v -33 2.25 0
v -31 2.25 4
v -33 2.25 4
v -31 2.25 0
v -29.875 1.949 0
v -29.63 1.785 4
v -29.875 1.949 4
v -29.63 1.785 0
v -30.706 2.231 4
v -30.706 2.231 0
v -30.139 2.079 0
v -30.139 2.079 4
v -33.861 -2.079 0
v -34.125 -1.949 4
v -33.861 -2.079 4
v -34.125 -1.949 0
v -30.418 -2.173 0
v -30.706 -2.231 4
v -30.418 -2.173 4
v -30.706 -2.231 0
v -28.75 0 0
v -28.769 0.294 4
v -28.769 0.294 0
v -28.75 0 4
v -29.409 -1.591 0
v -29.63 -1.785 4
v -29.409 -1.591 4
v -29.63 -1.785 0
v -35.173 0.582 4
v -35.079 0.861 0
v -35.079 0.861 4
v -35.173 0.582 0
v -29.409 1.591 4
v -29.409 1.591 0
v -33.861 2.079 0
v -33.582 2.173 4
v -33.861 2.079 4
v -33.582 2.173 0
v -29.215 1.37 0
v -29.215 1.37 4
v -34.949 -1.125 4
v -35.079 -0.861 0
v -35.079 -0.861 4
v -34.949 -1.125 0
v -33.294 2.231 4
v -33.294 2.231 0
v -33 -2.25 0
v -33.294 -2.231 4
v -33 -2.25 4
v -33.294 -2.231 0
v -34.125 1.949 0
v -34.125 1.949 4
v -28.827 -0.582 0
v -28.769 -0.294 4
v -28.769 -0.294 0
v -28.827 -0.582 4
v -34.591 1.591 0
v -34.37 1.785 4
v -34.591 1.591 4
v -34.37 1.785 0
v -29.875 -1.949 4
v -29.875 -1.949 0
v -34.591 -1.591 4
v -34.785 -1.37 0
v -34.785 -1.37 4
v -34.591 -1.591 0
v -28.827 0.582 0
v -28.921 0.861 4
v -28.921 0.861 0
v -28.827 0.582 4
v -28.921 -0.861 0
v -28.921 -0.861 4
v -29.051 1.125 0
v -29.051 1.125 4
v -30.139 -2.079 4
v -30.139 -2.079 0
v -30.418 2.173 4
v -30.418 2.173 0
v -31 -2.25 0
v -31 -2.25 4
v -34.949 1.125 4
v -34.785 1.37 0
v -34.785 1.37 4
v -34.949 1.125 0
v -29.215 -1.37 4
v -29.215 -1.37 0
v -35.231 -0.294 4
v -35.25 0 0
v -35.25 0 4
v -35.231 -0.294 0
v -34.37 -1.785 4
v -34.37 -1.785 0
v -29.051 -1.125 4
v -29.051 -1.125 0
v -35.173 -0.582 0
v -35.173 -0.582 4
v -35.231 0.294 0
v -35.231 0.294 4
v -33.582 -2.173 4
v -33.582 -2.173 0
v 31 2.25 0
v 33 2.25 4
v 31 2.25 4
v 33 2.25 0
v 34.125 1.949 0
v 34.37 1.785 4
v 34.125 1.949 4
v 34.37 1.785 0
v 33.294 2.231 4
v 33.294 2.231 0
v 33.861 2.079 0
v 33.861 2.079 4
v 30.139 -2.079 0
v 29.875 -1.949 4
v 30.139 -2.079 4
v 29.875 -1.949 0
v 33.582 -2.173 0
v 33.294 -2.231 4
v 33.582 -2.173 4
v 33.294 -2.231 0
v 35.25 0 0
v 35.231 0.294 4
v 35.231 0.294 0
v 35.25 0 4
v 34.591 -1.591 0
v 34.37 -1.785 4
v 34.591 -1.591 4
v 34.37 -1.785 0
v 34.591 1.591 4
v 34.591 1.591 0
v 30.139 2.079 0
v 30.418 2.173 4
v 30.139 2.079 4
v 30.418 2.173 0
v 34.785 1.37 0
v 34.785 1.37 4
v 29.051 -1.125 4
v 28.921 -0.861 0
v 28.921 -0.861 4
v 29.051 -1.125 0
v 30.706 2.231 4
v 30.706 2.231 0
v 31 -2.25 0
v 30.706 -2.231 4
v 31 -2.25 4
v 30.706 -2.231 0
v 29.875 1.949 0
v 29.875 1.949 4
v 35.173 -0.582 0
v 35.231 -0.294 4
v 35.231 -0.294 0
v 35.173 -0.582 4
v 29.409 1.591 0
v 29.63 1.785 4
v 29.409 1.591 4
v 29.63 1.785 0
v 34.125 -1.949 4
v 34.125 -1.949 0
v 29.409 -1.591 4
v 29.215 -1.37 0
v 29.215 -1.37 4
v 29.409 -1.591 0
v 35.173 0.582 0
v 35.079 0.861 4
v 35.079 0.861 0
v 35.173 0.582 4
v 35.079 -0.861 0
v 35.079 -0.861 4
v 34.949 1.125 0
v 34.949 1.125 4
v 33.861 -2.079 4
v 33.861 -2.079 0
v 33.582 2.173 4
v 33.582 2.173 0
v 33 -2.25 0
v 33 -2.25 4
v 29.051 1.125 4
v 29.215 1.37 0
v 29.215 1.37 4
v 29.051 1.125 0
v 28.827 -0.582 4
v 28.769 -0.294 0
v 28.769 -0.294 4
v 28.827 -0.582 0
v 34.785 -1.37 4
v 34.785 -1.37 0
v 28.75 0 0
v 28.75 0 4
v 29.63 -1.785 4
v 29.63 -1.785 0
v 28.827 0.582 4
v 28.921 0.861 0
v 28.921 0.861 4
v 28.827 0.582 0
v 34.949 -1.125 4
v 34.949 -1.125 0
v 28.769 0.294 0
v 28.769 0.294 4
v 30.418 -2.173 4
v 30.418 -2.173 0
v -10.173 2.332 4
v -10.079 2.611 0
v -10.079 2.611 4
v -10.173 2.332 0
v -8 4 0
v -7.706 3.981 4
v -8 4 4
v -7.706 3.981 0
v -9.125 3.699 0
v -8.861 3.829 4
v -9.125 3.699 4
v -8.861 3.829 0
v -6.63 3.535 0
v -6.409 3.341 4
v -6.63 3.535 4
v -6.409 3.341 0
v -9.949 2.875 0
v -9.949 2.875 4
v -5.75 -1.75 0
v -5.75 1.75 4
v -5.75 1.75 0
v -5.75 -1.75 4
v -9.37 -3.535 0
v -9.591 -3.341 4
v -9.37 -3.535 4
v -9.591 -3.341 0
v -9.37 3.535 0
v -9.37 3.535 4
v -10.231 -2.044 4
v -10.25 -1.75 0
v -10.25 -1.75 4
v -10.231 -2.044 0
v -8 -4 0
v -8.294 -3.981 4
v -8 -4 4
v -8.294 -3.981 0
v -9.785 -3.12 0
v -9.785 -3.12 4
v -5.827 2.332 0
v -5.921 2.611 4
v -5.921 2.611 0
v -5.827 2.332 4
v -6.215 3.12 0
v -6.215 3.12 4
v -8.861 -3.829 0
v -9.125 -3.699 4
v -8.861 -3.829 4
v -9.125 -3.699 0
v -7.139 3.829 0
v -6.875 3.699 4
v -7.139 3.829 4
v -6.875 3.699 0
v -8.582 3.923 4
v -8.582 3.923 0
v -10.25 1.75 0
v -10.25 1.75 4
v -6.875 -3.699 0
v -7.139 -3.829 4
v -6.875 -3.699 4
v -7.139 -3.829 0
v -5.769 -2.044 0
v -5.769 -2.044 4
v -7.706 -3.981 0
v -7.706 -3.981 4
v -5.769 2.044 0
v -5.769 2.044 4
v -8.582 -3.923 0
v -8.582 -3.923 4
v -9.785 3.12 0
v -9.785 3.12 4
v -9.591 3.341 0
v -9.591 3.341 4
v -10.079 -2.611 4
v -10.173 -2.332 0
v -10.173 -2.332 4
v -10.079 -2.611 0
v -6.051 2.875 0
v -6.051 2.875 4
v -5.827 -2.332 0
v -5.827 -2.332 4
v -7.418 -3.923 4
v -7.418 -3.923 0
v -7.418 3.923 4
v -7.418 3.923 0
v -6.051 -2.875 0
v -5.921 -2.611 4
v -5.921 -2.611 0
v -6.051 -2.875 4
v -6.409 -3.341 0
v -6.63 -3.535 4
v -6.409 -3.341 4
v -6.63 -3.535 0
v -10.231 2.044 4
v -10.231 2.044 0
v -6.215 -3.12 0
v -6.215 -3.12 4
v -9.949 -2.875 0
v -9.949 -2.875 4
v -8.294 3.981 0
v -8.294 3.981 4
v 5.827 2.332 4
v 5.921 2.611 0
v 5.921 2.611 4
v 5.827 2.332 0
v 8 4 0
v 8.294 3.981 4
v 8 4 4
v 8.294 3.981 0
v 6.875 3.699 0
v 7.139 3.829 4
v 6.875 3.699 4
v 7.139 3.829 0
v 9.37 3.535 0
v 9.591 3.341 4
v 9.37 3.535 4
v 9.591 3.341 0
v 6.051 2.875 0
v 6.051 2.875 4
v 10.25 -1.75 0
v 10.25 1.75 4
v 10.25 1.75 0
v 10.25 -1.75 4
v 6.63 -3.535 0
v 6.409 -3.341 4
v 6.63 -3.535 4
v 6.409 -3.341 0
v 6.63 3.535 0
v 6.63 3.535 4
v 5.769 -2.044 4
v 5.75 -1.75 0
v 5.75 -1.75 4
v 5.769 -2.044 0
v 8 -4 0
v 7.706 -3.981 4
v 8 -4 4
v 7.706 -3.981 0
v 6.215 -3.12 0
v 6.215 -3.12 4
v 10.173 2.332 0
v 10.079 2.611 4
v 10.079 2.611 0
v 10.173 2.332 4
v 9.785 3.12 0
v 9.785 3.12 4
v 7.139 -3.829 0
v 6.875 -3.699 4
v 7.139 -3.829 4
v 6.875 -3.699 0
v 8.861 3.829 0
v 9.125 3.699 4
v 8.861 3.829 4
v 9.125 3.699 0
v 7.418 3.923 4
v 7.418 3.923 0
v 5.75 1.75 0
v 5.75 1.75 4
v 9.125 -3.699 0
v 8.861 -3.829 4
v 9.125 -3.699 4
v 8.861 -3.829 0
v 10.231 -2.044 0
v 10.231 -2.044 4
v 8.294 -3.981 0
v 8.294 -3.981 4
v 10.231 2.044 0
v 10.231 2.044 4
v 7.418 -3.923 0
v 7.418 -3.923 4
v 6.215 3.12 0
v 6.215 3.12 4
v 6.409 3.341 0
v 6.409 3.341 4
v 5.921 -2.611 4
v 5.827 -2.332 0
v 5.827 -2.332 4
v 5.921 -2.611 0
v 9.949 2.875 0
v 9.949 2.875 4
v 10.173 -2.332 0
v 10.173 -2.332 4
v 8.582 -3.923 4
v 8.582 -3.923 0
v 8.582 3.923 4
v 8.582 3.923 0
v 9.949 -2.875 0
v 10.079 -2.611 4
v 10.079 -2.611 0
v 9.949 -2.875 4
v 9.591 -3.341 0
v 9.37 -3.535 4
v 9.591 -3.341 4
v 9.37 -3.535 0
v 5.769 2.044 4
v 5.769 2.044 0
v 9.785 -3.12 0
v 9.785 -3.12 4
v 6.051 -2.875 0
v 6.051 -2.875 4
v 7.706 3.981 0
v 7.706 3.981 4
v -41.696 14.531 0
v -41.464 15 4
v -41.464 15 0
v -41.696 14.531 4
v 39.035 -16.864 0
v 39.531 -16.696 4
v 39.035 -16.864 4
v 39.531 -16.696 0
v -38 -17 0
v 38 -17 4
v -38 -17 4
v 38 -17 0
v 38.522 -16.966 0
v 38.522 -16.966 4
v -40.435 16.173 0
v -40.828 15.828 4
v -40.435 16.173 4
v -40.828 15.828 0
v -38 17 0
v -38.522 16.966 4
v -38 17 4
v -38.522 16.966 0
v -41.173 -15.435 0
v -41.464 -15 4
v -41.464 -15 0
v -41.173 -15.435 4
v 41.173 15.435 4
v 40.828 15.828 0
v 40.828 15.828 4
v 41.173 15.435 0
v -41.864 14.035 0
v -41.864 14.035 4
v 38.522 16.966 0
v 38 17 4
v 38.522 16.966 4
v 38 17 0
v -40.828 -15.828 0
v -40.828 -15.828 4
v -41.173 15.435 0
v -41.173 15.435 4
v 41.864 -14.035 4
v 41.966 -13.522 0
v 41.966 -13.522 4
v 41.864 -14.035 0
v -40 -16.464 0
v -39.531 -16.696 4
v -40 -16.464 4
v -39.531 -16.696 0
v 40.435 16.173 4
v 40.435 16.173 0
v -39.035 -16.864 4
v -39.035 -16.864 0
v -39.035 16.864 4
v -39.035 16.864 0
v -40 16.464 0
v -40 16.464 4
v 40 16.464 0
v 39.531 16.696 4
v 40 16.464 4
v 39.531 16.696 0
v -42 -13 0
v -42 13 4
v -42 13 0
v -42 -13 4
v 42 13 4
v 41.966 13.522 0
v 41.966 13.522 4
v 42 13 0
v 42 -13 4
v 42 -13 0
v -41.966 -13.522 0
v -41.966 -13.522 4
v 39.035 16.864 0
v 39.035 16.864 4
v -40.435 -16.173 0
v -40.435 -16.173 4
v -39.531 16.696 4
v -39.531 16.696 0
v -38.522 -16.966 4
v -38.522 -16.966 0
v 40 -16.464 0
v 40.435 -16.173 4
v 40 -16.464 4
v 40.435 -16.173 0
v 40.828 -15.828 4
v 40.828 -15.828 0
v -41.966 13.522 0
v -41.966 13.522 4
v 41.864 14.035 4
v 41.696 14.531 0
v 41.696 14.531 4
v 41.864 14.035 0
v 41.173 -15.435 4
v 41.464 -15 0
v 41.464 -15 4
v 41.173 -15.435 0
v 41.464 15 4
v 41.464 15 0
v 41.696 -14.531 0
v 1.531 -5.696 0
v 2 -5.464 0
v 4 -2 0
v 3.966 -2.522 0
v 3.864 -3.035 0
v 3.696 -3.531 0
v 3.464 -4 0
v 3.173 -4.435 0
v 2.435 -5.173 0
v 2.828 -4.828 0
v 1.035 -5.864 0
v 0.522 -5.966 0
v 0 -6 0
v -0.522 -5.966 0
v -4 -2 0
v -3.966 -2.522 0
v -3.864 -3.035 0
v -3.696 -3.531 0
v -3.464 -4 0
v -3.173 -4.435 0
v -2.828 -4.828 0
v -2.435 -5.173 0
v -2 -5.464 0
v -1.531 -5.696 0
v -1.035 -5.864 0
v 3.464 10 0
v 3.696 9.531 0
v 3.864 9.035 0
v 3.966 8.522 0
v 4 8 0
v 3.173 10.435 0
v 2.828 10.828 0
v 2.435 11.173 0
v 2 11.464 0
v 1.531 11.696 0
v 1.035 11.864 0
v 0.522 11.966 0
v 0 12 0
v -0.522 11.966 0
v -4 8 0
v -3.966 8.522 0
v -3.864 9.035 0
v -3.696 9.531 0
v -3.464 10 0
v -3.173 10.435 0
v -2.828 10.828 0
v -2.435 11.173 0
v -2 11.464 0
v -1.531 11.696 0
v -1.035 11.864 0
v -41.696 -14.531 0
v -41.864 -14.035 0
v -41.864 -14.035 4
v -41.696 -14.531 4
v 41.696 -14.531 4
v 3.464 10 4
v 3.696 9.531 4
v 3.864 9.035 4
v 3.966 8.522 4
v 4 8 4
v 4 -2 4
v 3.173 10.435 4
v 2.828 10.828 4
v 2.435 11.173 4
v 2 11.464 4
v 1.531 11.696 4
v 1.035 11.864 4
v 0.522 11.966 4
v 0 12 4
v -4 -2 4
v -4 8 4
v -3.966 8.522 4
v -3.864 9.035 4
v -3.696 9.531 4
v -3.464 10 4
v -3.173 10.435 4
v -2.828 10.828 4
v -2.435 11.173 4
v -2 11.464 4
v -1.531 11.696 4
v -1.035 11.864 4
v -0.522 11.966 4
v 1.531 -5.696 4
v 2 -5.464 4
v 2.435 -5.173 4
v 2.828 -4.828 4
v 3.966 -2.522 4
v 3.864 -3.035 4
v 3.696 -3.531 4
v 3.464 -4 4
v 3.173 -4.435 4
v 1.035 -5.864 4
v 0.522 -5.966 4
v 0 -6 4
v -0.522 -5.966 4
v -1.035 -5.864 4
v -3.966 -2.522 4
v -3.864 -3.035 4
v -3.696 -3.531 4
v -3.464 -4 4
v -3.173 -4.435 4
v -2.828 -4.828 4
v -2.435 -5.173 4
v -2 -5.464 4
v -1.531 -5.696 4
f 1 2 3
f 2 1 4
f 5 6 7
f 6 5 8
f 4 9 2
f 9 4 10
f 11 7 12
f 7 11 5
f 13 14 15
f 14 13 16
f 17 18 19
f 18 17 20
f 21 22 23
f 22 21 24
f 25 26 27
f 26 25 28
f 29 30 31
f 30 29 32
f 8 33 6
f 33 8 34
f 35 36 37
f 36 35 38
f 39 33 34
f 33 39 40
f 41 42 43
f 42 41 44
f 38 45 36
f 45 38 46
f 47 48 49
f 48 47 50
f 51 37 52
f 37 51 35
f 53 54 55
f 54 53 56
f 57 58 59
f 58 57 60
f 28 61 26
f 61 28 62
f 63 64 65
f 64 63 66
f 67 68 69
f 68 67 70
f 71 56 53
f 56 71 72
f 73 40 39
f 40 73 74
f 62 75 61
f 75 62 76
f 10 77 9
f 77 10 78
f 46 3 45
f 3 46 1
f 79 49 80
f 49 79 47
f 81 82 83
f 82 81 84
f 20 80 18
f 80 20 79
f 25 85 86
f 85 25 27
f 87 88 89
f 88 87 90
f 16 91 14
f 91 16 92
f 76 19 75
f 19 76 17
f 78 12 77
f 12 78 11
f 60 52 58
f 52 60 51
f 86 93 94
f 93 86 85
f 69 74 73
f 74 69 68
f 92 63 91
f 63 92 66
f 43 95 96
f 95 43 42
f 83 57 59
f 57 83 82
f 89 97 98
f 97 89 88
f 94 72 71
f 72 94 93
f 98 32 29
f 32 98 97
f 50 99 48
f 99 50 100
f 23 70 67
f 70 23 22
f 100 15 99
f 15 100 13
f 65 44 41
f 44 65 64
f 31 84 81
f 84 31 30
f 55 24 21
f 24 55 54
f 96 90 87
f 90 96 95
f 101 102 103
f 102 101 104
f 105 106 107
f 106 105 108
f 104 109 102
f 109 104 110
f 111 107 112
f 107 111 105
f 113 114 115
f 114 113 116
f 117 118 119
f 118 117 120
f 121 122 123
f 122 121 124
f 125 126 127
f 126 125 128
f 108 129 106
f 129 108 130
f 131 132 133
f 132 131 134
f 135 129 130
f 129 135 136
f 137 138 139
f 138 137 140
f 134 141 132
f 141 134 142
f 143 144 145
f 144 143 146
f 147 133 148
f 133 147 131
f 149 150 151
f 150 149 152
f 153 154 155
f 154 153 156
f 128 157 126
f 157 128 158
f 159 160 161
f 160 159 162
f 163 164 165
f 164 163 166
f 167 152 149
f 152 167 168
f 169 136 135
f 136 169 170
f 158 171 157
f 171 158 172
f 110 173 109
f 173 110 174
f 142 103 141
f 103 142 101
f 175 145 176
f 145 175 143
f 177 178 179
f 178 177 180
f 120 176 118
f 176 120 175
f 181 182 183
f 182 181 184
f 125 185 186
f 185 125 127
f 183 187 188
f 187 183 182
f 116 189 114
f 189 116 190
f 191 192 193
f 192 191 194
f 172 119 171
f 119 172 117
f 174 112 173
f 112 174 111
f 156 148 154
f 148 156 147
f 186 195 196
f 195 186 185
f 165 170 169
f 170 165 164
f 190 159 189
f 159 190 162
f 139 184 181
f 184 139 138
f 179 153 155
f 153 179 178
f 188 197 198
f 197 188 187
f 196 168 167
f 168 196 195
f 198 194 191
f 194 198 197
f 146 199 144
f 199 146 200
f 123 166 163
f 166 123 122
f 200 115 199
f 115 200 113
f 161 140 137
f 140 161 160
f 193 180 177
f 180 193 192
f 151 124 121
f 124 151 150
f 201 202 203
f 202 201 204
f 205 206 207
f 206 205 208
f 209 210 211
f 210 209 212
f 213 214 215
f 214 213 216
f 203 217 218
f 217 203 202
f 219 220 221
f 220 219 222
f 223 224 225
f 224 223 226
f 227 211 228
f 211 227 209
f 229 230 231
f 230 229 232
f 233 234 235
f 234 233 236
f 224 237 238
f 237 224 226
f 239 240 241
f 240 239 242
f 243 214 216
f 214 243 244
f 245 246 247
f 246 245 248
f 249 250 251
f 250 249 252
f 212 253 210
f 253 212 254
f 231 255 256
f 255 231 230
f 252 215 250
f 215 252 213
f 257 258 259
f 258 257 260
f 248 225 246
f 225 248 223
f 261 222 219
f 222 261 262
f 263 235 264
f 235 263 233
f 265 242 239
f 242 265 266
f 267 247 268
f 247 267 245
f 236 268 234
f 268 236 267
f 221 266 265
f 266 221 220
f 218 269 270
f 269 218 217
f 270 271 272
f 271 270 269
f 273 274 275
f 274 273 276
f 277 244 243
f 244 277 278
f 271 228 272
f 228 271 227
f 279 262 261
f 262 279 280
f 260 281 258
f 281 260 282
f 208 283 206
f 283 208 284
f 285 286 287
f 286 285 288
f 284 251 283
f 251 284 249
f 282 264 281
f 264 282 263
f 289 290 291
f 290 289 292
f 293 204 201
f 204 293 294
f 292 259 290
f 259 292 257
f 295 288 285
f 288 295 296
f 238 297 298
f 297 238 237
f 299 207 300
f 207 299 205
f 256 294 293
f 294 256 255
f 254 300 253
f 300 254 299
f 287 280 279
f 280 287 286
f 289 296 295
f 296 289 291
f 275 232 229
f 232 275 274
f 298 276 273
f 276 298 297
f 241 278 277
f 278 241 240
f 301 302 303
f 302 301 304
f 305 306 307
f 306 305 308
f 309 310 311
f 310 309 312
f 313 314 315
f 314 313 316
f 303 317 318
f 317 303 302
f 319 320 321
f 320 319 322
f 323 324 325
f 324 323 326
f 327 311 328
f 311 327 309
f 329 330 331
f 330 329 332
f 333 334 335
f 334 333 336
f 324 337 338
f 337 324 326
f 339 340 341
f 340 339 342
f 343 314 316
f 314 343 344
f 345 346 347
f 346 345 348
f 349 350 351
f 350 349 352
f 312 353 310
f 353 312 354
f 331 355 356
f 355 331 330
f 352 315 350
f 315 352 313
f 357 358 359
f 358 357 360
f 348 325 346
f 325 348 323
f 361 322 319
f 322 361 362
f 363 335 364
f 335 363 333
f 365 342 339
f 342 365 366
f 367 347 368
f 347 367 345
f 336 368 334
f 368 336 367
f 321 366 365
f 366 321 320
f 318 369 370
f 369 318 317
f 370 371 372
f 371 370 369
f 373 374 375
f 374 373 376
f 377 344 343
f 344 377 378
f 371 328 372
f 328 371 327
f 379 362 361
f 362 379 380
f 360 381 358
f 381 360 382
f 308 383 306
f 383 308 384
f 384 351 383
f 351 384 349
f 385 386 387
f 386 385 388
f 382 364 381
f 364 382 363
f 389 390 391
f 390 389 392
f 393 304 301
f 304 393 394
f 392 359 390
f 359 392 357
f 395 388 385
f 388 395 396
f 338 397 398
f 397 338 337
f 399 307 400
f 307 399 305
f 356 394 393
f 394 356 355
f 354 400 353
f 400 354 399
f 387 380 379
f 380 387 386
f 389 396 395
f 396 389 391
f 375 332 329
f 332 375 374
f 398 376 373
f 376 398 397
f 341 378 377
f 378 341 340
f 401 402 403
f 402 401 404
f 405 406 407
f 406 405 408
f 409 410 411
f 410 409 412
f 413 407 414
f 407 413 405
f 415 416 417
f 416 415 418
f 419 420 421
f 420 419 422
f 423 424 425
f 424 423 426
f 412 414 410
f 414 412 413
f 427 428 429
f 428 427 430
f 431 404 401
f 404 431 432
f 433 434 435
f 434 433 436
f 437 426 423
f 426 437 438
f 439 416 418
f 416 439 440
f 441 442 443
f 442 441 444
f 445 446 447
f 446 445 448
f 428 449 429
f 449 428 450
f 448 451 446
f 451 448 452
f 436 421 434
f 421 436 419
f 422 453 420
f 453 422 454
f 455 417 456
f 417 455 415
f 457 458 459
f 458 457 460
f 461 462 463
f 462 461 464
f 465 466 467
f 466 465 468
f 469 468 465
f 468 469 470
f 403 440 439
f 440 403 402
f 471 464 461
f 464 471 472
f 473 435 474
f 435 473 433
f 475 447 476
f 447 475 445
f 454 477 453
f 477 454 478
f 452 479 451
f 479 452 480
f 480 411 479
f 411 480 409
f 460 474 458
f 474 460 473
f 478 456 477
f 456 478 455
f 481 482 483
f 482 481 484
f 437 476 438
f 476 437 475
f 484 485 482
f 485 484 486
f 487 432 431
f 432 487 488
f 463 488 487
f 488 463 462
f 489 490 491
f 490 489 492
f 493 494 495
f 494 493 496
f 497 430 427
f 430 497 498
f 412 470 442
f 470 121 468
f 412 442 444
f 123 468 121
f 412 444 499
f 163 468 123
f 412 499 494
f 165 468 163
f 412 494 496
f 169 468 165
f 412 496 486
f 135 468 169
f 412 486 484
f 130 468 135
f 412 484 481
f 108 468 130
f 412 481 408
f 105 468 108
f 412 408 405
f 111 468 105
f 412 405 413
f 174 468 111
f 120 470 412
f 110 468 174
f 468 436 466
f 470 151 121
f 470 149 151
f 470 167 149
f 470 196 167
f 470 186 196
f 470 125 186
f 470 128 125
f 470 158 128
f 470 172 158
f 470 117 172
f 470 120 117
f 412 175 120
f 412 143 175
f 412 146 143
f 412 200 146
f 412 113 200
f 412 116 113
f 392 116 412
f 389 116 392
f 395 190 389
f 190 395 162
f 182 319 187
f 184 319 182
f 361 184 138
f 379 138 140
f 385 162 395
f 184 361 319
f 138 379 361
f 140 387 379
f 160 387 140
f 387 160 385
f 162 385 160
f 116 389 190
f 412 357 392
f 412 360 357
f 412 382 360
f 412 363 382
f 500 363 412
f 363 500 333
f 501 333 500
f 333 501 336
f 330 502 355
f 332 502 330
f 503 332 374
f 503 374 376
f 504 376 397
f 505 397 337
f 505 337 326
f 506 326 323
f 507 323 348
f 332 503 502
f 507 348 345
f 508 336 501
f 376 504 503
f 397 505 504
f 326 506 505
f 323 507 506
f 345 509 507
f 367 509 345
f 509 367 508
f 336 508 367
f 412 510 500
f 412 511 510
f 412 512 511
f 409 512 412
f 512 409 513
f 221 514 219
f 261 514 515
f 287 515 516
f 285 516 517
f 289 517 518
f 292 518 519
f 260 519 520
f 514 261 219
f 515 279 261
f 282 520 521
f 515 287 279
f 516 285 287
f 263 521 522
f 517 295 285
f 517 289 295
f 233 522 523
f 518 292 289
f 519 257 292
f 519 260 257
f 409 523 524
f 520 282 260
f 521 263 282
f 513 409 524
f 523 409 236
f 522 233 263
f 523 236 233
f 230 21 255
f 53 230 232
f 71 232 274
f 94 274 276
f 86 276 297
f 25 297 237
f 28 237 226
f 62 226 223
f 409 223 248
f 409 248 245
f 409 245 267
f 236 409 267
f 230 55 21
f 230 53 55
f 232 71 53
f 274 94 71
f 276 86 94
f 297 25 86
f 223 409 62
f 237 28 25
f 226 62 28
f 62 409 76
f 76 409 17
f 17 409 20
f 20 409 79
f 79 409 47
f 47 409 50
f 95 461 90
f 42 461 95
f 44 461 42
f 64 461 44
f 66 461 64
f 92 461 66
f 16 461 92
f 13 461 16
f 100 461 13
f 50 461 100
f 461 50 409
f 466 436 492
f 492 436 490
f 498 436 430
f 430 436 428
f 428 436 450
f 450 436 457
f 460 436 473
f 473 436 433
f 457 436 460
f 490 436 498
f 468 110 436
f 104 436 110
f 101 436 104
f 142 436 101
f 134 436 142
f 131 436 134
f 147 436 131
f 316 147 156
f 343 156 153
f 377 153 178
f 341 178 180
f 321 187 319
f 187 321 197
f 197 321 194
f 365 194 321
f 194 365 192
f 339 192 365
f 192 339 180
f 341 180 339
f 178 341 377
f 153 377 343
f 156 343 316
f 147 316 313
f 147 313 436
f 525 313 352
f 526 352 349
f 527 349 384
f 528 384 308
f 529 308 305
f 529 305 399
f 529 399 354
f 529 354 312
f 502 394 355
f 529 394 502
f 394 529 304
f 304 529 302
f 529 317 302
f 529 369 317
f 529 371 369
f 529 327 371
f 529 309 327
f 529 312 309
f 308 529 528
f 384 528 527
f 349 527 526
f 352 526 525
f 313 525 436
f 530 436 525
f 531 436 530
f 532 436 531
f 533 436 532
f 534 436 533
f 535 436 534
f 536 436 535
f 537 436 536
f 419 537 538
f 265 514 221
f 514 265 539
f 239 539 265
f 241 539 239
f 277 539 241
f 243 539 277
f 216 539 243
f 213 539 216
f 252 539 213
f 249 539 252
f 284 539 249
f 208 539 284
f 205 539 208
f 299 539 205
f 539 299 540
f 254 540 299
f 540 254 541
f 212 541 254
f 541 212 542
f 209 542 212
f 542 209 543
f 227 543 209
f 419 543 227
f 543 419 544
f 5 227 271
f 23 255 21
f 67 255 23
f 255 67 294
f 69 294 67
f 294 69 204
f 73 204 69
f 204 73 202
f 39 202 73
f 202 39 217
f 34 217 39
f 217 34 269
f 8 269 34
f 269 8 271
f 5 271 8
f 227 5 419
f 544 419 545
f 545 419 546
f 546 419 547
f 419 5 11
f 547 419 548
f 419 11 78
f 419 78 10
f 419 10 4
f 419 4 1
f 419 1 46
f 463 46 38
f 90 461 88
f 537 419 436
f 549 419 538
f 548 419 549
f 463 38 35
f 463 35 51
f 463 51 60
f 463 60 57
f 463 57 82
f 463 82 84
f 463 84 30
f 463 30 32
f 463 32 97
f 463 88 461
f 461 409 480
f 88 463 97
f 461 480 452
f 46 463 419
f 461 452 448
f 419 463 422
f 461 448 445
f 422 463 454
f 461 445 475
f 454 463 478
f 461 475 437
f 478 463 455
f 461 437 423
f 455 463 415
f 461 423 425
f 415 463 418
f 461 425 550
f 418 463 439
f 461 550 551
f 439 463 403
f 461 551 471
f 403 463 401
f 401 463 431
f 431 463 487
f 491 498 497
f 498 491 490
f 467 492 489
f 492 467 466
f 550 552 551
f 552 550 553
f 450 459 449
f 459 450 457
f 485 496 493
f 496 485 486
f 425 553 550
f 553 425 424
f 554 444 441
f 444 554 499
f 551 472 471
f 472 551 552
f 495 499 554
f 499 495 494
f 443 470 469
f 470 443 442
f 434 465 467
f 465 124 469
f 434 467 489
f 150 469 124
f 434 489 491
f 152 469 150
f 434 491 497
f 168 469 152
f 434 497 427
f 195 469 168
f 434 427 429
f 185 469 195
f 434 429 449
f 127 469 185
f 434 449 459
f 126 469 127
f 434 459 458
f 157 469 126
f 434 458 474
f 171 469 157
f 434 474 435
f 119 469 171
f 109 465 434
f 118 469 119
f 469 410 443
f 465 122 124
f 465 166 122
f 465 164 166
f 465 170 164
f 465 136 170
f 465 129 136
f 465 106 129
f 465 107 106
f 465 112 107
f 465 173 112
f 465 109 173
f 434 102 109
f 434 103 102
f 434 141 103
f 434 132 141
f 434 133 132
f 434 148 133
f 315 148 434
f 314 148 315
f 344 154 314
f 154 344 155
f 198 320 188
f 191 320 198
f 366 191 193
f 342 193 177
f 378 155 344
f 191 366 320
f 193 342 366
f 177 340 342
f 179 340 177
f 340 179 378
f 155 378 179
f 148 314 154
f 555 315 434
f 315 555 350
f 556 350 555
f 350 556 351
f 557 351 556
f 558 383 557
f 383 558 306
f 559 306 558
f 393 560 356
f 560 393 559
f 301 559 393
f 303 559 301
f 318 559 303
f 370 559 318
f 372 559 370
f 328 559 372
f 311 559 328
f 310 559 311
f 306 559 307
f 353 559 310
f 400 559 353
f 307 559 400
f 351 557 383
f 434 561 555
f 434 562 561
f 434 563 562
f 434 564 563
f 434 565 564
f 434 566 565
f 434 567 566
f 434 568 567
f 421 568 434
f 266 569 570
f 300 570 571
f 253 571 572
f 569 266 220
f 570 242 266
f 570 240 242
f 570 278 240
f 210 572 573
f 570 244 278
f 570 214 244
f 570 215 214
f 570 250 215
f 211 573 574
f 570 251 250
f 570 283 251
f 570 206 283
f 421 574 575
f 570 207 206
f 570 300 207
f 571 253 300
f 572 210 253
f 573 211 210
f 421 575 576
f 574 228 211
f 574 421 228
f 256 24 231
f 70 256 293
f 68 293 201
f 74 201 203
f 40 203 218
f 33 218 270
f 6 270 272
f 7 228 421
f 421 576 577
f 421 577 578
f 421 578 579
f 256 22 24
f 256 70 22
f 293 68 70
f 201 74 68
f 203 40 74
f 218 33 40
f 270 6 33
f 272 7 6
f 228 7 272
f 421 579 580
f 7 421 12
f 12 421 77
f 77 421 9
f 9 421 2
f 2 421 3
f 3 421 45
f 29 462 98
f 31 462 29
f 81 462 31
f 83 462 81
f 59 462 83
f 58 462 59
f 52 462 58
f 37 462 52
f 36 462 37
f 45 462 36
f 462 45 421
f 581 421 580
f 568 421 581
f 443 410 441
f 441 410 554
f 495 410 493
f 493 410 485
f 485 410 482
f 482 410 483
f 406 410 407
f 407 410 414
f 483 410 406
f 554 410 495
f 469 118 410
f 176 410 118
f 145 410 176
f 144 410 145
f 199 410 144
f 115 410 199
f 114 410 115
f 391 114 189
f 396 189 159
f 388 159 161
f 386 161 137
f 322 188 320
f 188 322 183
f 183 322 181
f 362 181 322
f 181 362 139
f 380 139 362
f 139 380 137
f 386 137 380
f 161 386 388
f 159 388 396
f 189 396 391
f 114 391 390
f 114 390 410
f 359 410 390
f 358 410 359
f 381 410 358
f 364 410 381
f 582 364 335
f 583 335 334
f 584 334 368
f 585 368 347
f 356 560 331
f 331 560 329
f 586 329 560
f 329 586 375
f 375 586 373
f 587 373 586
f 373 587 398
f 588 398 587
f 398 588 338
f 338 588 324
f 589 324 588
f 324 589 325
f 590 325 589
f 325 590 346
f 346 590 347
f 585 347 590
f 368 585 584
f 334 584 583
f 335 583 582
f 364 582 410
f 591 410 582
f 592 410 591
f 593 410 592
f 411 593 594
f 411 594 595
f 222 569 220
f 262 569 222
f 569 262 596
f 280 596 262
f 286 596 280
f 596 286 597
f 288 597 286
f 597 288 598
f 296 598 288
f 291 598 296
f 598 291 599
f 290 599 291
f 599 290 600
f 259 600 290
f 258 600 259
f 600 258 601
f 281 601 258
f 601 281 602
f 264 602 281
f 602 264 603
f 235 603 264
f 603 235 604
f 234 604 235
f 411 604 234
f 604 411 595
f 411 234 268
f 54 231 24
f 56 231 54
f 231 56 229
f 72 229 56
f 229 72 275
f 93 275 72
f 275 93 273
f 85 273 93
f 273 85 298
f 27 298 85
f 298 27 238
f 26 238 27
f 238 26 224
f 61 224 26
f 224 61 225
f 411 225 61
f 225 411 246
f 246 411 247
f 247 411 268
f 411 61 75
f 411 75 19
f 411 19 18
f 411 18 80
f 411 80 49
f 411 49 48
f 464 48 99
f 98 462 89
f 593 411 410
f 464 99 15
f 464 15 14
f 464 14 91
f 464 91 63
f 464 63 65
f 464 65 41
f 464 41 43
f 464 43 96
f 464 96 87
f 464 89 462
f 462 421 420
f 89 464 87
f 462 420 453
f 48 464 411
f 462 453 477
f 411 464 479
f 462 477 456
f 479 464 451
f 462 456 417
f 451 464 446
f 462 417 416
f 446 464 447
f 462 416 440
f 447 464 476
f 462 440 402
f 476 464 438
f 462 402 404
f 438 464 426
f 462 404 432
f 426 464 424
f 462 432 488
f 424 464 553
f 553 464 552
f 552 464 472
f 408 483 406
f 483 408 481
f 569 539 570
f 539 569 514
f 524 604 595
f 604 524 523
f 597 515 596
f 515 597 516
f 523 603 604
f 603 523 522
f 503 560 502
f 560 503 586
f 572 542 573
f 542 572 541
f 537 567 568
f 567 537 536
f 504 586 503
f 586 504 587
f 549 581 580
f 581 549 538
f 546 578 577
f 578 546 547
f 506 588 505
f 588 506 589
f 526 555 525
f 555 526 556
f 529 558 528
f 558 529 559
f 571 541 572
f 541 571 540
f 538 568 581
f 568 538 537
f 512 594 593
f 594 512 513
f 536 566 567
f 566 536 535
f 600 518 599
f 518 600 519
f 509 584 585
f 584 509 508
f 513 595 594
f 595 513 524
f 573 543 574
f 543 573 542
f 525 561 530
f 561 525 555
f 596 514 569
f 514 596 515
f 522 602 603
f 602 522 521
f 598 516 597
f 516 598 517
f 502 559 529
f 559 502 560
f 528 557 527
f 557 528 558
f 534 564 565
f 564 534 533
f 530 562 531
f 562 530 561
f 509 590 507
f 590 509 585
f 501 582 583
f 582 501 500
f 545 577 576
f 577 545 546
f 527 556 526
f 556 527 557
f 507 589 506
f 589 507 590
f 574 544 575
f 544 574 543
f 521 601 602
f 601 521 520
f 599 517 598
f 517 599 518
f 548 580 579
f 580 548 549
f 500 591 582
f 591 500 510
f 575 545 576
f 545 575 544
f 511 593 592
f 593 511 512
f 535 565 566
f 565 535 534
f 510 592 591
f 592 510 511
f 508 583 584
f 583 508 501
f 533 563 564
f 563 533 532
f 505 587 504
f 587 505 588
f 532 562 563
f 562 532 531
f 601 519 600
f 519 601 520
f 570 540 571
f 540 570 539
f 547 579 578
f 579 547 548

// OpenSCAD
// Camera adapter strip: bolts the v5 camera cradle (camera-mount.scad) rigidly
// to the rover chassis. The cradle used to sit loose on the plate and shifted
// on every jerky pulse, which corrupted the marker bearings.
//
// The strip spans the two front M4 standoffs on the chassis plate (Makeblock
// grid, 64 mm centre-to-centre, 30 mm tall) and bolts down into their tops.
// On top it presents the cradle's own hole pattern (M4 slots on 8 mm
// centres) so the cradle bolts to the strip with two M4 screws and nuts.
// The camera lead drops through a narrow slot under the cradle - plug the
// camera in and seat it in the cradle first, then bolt the cradle down.
//
// Orientation: the strip runs LEFT-RIGHT across the rover (X); Y is the
// travel axis, +Y forward. Print flat, no supports, no brim.
//
// Render:  openscad -o camera-strip.stl camera-strip.scad

// ---- Chassis (measured by Enoch, 2026-09-29) --------------------------------
post_cc     = 64.0;   // standoff centre-to-centre; measured 68.5 mm across the
                      // outer edges of the M4 holes, i.e. 8 Makeblock grid units
post_slot_l = 6.5;    // slot length along X so 63-66 mm c-c all fit
m4_hole     = 4.5;    // M4 clearance, slightly oversized on purpose (Enoch's ask)

// ---- Cradle interface (must match camera-mount.scad) -----------------------
mb_pitch    = 8;      // cradle slots sit at x = +/-8
cradle_slot = 8;      // cradle slot length along Y - mirrored here for +/-4 mm adjust
cable_w     = 8.0;    // cable-only pass-through (the plug goes in before bolting)
cable_l     = 18.0;
cable_y     = 3.0;    // same aft offset as the cradle's cable slot

// ---- Strip ------------------------------------------------------------------
strip_l = post_cc + 20;   // 84 mm: 10 mm of material beyond each post
strip_w = 34;
strip_t = 4;
corner  = 4;

$fn = 48;

module slot(len, d, along = "y") {
  a = (along == "x") ? [1, 0] : [0, 1];
  hull() for (s = [-1, 1]) translate([s * a[0] * (len - d) / 2, s * a[1] * (len - d) / 2, -1])
    cylinder(d = d, h = strip_t + 2);
}

module strip() {
  difference() {
    linear_extrude(strip_t)
      offset(r = corner) offset(delta = -corner) square([strip_l, strip_w], center = true);
    // standoff bolts, slotted along X to absorb the c-c uncertainty
    for (x = [-post_cc / 2, post_cc / 2]) translate([x, 0, 0]) slot(post_slot_l, m4_hole, "x");
    // cradle bolts, slotted along Y like the cradle's own base
    for (x = [-mb_pitch, mb_pitch]) translate([x, 0, 0]) slot(cradle_slot, m4_hole, "y");
    // camera lead
    translate([0, cable_y, 0]) slot(cable_l, cable_w, "y");
  }
}

strip();
